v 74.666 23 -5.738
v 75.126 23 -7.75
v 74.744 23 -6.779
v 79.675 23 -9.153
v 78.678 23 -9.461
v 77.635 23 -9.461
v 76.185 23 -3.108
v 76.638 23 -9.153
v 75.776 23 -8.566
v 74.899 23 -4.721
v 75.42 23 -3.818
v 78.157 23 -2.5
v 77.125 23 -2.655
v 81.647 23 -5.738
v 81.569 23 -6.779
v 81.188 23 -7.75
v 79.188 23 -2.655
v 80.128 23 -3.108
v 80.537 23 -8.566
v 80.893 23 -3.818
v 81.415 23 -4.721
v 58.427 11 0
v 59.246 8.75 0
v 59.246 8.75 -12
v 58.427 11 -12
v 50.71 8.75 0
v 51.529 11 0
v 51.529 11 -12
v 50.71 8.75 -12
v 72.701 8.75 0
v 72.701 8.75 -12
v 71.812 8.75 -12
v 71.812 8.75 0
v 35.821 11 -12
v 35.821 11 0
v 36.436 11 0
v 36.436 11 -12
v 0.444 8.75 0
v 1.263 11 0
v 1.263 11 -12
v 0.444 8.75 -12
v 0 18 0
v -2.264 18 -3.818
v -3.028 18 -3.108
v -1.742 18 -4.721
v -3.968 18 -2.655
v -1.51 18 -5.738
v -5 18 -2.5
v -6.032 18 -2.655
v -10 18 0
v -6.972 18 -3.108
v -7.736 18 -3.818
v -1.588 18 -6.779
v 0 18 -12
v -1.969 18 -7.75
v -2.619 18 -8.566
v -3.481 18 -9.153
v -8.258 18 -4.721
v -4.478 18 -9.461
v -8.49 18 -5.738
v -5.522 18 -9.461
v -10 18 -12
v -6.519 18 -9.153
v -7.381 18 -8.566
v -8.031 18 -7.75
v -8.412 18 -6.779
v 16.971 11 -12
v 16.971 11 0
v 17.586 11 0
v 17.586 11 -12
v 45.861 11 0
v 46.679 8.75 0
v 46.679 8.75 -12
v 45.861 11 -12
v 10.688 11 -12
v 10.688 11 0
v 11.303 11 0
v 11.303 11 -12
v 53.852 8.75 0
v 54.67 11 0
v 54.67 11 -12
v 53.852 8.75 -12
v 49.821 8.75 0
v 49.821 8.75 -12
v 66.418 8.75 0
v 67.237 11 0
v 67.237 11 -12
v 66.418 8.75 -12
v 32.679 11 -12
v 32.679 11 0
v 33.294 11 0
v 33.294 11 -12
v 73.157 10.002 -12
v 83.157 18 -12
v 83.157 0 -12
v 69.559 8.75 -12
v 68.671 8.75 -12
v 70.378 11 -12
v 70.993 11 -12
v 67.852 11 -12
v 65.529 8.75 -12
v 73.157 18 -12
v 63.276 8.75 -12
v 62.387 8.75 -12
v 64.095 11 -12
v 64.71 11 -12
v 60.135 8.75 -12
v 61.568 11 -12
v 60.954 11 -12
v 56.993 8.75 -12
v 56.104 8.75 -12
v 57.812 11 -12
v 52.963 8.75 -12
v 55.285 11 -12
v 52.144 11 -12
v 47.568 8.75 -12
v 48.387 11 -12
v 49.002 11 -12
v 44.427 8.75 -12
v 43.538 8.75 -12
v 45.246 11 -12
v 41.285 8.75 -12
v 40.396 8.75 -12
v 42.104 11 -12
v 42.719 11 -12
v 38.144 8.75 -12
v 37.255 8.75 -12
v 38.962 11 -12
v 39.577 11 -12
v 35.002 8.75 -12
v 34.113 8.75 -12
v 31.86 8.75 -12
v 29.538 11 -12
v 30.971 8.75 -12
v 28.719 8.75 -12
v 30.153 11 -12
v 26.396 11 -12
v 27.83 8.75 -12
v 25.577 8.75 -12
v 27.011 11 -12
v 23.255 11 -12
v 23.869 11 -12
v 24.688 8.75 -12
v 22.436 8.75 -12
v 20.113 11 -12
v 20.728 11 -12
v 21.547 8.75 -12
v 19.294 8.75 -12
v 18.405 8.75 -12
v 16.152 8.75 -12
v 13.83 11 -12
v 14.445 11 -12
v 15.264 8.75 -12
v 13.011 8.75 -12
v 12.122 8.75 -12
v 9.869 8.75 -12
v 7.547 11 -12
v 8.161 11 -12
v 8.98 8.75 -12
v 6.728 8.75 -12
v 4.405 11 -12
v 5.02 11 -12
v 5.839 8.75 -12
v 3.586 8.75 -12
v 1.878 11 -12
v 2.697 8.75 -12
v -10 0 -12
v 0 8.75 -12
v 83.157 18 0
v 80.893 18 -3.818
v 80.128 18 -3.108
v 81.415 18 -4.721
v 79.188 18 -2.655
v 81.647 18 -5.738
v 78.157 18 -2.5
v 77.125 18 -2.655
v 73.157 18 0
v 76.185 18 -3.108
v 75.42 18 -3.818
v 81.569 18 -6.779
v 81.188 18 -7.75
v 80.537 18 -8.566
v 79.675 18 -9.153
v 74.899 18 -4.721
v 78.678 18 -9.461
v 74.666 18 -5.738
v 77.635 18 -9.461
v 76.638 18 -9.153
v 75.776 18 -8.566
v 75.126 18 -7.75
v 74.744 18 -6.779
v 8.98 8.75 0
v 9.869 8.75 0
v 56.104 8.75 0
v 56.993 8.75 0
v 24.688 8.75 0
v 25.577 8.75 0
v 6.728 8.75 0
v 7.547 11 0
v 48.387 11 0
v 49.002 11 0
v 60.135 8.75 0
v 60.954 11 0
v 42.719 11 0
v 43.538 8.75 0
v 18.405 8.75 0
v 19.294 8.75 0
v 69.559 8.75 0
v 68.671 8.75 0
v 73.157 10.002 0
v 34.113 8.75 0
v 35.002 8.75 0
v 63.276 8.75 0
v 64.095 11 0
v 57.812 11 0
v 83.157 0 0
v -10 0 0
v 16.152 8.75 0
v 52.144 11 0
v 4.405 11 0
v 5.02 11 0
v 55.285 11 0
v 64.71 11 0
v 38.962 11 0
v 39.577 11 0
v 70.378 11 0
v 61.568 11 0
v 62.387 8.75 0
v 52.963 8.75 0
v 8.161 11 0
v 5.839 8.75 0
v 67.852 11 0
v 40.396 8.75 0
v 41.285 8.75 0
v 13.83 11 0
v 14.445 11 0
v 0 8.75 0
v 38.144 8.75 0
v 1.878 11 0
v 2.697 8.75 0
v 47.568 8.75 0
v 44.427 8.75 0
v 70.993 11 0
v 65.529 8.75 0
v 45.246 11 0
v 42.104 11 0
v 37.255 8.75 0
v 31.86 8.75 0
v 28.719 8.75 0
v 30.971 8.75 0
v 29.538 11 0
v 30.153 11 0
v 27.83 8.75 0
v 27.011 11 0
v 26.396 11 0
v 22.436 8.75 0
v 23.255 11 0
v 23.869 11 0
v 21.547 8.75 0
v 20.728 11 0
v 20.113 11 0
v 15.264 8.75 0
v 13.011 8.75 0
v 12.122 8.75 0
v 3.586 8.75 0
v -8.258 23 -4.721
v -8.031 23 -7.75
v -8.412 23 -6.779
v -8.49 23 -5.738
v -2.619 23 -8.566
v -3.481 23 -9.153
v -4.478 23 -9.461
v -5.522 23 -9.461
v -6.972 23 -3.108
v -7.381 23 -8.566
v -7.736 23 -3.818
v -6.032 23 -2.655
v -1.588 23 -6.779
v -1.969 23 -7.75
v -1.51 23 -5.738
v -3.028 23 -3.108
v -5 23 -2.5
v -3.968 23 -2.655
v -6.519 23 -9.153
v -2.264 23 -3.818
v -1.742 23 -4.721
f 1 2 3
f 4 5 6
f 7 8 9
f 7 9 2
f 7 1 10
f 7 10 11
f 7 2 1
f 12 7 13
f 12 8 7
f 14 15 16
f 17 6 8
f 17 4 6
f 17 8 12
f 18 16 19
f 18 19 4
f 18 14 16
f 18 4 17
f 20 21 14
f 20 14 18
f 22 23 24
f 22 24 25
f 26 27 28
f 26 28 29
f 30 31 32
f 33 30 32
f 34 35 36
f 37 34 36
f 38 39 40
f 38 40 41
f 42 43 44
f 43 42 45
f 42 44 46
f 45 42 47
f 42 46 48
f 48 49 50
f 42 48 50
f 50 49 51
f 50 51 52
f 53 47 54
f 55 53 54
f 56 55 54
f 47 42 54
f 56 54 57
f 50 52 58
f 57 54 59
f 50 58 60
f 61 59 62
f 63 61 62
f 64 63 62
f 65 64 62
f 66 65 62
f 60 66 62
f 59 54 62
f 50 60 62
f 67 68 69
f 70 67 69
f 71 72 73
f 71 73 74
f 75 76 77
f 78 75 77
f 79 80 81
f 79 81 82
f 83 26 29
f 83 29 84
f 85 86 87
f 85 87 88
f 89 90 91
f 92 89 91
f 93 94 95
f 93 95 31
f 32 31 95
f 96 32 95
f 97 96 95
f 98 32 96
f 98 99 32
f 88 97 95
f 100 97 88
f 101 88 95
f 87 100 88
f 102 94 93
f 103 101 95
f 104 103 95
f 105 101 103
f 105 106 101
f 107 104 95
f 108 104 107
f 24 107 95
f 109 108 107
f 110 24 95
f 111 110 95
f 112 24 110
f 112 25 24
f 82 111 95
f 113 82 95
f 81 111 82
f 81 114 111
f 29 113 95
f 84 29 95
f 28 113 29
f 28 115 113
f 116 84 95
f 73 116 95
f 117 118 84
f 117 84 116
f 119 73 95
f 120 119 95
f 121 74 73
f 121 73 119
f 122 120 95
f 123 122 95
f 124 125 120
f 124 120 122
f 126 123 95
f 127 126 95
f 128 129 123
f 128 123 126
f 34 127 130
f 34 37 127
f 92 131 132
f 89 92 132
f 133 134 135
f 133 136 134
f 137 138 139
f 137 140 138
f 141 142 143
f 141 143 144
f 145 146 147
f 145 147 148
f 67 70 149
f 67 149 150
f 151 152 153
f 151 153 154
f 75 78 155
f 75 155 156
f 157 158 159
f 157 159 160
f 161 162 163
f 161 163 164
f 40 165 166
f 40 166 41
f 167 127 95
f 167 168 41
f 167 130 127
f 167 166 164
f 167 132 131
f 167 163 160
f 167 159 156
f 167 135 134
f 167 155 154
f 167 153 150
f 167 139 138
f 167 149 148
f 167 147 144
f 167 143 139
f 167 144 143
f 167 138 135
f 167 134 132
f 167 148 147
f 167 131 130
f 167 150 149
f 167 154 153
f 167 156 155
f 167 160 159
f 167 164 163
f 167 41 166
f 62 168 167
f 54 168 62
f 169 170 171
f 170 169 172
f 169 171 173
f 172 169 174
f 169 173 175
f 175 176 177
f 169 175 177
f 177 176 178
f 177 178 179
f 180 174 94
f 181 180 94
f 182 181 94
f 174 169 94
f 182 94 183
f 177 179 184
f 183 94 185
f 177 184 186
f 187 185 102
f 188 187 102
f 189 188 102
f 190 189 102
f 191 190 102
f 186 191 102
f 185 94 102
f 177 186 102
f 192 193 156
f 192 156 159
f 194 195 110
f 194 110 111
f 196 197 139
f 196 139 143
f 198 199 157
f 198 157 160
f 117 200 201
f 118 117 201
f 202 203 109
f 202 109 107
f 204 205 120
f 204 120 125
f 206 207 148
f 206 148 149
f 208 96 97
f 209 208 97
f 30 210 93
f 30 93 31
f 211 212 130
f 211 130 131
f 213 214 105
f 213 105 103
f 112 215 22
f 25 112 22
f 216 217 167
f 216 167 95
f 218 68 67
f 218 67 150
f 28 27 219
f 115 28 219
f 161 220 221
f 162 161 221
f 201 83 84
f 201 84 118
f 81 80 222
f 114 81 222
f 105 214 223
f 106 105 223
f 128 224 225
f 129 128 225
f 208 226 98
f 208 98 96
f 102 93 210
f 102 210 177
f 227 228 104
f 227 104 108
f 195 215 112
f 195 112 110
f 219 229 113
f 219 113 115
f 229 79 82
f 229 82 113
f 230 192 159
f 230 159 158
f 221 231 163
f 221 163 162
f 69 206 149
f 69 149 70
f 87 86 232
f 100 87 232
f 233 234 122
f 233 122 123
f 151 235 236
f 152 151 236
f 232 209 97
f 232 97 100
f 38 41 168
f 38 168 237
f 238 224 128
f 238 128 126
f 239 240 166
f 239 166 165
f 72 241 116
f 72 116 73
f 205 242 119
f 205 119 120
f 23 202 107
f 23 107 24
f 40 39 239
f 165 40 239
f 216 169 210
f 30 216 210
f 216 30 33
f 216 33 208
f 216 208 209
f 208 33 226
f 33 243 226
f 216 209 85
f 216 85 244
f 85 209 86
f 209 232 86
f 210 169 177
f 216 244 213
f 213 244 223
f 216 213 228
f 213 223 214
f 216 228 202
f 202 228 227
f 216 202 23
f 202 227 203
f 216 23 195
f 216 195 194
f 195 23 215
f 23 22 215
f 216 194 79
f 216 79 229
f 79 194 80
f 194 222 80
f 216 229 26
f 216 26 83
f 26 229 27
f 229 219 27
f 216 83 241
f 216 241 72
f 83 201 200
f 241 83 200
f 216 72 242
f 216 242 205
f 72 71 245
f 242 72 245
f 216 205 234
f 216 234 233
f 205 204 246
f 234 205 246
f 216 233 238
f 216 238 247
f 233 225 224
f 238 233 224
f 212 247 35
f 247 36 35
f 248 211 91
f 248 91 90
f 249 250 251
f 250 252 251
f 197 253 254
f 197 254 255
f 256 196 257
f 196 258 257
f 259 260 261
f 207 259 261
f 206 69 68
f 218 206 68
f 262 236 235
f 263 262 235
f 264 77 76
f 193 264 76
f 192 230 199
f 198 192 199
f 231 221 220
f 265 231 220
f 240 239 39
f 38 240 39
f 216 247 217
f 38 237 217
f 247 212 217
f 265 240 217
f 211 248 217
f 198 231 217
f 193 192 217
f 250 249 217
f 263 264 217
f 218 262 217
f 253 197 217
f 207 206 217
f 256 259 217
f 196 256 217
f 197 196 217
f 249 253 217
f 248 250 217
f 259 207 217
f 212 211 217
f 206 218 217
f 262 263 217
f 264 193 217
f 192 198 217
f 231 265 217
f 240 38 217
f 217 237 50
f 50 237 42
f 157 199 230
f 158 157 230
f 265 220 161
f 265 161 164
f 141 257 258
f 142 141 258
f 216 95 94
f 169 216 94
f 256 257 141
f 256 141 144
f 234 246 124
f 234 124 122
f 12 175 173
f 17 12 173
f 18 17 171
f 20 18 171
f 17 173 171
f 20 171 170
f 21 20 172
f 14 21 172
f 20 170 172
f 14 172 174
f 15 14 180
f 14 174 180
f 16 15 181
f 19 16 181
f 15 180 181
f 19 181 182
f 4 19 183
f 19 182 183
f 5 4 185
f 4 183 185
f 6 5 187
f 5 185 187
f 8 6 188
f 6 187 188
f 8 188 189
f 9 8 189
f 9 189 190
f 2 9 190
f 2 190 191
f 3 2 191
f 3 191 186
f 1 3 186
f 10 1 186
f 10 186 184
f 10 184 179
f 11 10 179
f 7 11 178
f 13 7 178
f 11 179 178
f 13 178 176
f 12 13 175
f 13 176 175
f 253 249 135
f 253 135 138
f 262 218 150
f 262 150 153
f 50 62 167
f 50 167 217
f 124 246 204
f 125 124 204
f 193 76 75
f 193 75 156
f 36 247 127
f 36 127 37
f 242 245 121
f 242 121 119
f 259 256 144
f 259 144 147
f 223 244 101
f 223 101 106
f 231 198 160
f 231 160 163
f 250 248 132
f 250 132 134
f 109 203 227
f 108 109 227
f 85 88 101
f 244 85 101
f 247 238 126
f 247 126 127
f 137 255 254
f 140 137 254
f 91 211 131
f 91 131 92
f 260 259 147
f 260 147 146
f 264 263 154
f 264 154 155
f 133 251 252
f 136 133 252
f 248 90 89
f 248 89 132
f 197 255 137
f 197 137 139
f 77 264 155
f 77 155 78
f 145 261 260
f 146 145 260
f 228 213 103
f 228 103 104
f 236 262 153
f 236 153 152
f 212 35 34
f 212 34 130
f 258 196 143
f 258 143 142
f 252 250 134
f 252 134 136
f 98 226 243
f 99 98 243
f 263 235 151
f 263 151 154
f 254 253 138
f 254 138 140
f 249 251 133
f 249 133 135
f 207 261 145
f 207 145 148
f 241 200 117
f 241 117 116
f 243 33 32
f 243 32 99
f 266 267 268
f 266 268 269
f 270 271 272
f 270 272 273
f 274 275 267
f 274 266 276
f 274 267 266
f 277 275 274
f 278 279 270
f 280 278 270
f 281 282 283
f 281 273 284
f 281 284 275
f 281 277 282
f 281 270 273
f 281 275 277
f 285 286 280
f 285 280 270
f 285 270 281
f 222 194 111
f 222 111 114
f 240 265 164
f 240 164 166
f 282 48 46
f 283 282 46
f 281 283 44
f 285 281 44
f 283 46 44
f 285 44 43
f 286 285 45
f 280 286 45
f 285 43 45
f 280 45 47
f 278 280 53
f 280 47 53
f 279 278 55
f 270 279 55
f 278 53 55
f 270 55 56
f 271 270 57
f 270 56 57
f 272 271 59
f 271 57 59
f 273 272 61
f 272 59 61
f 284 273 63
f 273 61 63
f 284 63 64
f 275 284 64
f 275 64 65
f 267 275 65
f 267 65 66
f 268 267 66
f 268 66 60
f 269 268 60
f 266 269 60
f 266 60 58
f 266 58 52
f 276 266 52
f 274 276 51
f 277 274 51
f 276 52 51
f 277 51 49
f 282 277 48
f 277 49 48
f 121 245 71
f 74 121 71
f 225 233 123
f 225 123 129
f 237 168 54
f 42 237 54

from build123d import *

# Parameters (mm, degrees)
BLANKSKE_W          = 73.1567043
BLANKSKE_H          = 11
BLANK_DEPTH         = 12
TOOTHCUTSIM_DEPTH   = 75.946003122
TEETHCUTS_COUNT     = 24
TEETHCUTS_PITCH     = 3.14159265
SKETCH1_W           = 12
SKETCH1_H           = 8.75
BOSS_EXTRUDE1_DEPTH = 10
SKETCH3_W           = 10
SKETCH3_H           = 8.75
BOSS_EXTRUDE2_DEPTH = 12
SKETCH4_W           = 10
SKETCH4_H           = 9.25
BOSS_EXTRUDE3_DEPTH = 12
SKETCH6_R           = 3.5
BOSS_EXTRUDE5_DEPTH = 5


with BuildPart() as part:
    # BlankSke → Blank (new body)
    with BuildSketch(Plane.XY):
        with Locations((36.57835215, 5.5)):
            Rectangle(BLANKSKE_W, BLANKSKE_H)
    extrude(amount=-BLANK_DEPTH)

    # TooCutSkeSim → ToothCutSim (cut, through all)
    with BuildSketch(Plane.XY):
        Polygon((0.44443537, 8.75), (-0.44443537, 8.75), (-1.272613241, 11.0254), (1.272613241, 11.0254), align=None)
    toothcutsim = extrude(amount=-TOOTHCUTSIM_DEPTH, mode=Mode.SUBTRACT)

    # TeethCuts: ToothCutSim ×24
    with Locations(*[(i * TEETHCUTS_PITCH, 0, 0) for i in range(1, TEETHCUTS_COUNT)]):
        add(toothcutsim, mode=Mode.SUBTRACT)

    # Sketch1 → Boss-Extrude1 (add)
    with BuildSketch(Plane.ZY):
        with Locations((-6, 4.375)):
            Rectangle(SKETCH1_W, SKETCH1_H)
    extrude(amount=BOSS_EXTRUDE1_DEPTH)

    # Sketch3 → Boss-Extrude2 (add, through all)
    with BuildSketch(Plane.XY):
        with Locations((78.1567043, 4.375)):
            Rectangle(SKETCH3_W, SKETCH3_H)
    extrude(amount=-BOSS_EXTRUDE2_DEPTH)

    # Sketch4 → Boss-Extrude3 (add, through all)
    with BuildSketch(Plane(origin=(0, 0, -12), x_dir=(-1, 0, 0), z_dir=(0, 0, -1))):
        with Locations((-78.1567043, 13.375)):
            Rectangle(SKETCH4_W, SKETCH4_H)
        with Locations((5, 13.375)):
            Rectangle(SKETCH4_W, SKETCH4_H)
    extrude(amount=-BOSS_EXTRUDE3_DEPTH)

    # Sketch6 → Boss-Extrude5 (add)
    with BuildSketch(Plane(origin=(0, 18, 0), x_dir=(1, 0, 0), z_dir=(0, 1, 0))):
        with Locations(Location((-5, 6, 0), (0, 0, 270))):
            Circle(SKETCH6_R)
        with Locations(Location((78.1567043, 6, 0), (0, 0, 270))):
            Circle(SKETCH6_R)
    extrude(amount=BOSS_EXTRUDE5_DEPTH)


solid = part.part
